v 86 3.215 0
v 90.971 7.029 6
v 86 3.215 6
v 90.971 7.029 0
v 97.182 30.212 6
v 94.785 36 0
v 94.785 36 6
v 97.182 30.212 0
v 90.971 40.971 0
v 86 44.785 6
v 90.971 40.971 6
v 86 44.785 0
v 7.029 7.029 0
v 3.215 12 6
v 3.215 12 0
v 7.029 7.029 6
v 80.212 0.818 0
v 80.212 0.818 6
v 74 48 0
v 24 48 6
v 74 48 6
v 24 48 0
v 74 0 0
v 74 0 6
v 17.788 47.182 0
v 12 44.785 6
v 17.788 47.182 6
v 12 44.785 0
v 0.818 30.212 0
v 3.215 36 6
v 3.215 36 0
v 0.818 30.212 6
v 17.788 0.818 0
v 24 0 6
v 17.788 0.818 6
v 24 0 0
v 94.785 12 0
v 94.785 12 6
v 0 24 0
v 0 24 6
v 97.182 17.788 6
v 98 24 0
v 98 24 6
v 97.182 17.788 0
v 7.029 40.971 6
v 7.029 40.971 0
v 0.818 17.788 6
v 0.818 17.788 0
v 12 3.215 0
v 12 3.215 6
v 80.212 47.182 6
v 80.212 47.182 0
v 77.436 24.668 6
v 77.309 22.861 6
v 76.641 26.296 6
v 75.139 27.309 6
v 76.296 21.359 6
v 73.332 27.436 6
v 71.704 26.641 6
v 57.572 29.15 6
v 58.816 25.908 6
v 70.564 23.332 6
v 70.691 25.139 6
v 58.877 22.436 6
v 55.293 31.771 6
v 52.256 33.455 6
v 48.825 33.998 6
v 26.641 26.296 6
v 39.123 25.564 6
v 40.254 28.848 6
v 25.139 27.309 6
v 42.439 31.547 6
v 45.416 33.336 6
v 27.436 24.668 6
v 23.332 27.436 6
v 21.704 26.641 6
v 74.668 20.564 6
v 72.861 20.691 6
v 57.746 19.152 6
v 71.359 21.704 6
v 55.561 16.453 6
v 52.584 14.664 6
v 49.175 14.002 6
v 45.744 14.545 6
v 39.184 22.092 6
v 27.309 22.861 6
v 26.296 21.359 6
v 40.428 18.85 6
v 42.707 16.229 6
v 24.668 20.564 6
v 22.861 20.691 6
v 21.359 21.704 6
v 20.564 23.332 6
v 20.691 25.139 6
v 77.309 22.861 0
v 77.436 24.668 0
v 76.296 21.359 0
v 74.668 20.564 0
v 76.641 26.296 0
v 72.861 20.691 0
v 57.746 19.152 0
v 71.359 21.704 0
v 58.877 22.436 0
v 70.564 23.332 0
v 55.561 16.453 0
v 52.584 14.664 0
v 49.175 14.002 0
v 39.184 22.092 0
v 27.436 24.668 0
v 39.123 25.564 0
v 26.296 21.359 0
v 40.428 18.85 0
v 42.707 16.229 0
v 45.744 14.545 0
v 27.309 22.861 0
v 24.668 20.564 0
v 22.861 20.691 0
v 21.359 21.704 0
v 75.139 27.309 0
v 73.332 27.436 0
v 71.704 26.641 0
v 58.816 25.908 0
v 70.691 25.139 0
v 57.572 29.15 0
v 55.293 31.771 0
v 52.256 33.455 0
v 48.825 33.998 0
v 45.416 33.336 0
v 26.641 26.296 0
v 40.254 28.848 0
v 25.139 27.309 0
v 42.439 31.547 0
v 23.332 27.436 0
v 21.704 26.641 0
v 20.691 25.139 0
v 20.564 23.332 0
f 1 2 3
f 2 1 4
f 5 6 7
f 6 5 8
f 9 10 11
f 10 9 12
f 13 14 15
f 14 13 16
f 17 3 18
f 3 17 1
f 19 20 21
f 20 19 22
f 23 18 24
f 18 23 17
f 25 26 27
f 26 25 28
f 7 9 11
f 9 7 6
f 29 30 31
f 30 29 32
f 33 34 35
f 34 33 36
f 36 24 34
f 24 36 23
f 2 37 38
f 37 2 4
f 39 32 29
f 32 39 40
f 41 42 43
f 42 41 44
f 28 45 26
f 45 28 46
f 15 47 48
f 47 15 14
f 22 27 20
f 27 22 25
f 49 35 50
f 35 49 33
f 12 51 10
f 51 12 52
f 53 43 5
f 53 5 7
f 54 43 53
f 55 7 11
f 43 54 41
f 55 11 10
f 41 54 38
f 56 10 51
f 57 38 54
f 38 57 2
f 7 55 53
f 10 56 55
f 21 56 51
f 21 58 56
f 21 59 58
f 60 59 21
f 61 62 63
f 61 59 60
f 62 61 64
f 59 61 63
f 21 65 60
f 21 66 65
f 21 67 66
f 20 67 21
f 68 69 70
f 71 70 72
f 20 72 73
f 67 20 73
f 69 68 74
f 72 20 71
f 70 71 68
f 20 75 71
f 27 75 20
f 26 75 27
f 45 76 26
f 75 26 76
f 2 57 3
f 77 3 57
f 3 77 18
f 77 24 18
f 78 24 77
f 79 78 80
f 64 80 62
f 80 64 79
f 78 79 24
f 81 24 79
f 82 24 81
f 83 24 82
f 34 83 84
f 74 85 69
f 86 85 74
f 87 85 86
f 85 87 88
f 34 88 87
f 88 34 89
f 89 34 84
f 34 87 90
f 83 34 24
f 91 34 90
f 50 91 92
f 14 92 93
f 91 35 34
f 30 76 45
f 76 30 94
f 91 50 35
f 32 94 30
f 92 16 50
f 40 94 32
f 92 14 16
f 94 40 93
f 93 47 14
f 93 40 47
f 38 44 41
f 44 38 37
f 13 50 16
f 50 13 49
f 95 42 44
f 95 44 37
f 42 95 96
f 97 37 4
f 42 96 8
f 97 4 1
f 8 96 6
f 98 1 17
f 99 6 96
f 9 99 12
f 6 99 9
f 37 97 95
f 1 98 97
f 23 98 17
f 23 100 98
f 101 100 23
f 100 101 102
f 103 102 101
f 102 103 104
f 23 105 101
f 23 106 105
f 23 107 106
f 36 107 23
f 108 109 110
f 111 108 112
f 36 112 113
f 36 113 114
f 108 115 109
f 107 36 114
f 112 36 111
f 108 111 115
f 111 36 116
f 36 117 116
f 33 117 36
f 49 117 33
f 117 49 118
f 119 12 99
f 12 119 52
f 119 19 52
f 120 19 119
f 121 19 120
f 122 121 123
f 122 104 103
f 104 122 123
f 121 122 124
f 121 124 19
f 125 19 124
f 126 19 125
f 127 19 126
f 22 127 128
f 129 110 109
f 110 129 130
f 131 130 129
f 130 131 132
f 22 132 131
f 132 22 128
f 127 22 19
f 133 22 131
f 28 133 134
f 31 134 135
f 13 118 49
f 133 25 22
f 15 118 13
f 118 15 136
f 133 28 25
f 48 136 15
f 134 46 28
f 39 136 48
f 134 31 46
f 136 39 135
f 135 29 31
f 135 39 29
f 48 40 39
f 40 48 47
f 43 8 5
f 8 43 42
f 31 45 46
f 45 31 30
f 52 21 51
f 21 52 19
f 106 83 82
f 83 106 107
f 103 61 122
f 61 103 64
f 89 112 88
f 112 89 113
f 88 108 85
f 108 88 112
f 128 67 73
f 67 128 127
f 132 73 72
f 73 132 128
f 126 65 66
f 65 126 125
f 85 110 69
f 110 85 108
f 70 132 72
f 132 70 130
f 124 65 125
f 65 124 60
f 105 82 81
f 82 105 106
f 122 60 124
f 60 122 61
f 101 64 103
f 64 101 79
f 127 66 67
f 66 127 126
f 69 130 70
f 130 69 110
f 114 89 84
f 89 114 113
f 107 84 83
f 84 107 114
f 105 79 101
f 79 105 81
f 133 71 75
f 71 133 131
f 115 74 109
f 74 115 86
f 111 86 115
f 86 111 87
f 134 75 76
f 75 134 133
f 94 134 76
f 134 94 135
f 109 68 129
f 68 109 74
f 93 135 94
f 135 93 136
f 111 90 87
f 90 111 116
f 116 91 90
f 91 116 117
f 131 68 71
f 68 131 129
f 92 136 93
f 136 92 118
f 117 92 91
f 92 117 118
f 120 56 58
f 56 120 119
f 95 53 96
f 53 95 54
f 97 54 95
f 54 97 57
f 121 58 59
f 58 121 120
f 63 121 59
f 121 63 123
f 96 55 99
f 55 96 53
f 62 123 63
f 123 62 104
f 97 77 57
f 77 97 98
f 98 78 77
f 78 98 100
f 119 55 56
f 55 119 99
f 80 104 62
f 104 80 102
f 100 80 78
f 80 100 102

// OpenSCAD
$fn = 32;

// ----------------------------------------------------------------------
// Spacer plate: obround span 50, caps R24
// ----------------------------------------------------------------------

// --- parameters (mm) ---
bore_r = 10;              // centre bore radius
bolt_r = 3.5;             // bolt hole radius
plate_t = 6;              // plate thickness, Z (extrusion height)
span = 50;                // obround span
cap_r = 24;               // cap radius
fit_tol = 0.05;           // declared fit tolerance (prompt contract)
free_tol = 0.2;           // declared free tolerance (prompt contract)

profile = [[24, 48], [17.788, 47.182], [12, 44.785], [7.029, 40.971], [3.215, 36], [0.818, 30.212], [0, 24], [0.818, 17.788], [3.215, 12], [7.029, 7.029], [12, 3.215], [17.788, 0.818], [24, 0], [74, 0], [80.212, 0.818], [86, 3.215], [90.971, 7.029], [94.785, 12], [97.182, 17.788], [98, 24], [97.182, 30.212], [94.785, 36], [90.971, 40.971], [86, 44.785], [80.212, 47.182], [74, 48]];  // primary outline, 26 points, counter clockwise
void_1 = [[58.816, 25.908], [57.572, 29.15], [55.293, 31.771], [52.256, 33.455], [48.825, 33.998], [45.416, 33.336], [42.439, 31.547], [40.254, 28.848], [39.123, 25.564], [39.184, 22.092], [40.428, 18.85], [42.707, 16.229], [45.744, 14.545], [49.175, 14.002], [52.584, 14.664], [55.561, 16.453], [57.746, 19.152], [58.877, 22.436]];  // centre bore, 18 points
void_2 = [[27.436, 24.668], [26.641, 26.296], [25.139, 27.309], [23.332, 27.436], [21.704, 26.641], [20.691, 25.139], [20.564, 23.332], [21.359, 21.704], [22.861, 20.691], [24.668, 20.564], [26.296, 21.359], [27.309, 22.861]];  // end hole, 12 points
void_3 = [[77.436, 24.668], [76.641, 26.296], [75.139, 27.309], [73.332, 27.436], [71.704, 26.641], [70.691, 25.139], [70.564, 23.332], [71.359, 21.704], [72.861, 20.691], [74.668, 20.564], [76.296, 21.359], [77.309, 22.861]];  // end hole, 12 points

// --- the one profile operation ---
difference() {
  linear_extrude(height = plate_t) polygon(points = profile);
  translate([0, 0, -1])
    linear_extrude(height = plate_t + 2) polygon(points = void_1);
  translate([0, 0, -1])
    linear_extrude(height = plate_t + 2) polygon(points = void_2);
  translate([0, 0, -1])
    linear_extrude(height = plate_t + 2) polygon(points = void_3);
}
